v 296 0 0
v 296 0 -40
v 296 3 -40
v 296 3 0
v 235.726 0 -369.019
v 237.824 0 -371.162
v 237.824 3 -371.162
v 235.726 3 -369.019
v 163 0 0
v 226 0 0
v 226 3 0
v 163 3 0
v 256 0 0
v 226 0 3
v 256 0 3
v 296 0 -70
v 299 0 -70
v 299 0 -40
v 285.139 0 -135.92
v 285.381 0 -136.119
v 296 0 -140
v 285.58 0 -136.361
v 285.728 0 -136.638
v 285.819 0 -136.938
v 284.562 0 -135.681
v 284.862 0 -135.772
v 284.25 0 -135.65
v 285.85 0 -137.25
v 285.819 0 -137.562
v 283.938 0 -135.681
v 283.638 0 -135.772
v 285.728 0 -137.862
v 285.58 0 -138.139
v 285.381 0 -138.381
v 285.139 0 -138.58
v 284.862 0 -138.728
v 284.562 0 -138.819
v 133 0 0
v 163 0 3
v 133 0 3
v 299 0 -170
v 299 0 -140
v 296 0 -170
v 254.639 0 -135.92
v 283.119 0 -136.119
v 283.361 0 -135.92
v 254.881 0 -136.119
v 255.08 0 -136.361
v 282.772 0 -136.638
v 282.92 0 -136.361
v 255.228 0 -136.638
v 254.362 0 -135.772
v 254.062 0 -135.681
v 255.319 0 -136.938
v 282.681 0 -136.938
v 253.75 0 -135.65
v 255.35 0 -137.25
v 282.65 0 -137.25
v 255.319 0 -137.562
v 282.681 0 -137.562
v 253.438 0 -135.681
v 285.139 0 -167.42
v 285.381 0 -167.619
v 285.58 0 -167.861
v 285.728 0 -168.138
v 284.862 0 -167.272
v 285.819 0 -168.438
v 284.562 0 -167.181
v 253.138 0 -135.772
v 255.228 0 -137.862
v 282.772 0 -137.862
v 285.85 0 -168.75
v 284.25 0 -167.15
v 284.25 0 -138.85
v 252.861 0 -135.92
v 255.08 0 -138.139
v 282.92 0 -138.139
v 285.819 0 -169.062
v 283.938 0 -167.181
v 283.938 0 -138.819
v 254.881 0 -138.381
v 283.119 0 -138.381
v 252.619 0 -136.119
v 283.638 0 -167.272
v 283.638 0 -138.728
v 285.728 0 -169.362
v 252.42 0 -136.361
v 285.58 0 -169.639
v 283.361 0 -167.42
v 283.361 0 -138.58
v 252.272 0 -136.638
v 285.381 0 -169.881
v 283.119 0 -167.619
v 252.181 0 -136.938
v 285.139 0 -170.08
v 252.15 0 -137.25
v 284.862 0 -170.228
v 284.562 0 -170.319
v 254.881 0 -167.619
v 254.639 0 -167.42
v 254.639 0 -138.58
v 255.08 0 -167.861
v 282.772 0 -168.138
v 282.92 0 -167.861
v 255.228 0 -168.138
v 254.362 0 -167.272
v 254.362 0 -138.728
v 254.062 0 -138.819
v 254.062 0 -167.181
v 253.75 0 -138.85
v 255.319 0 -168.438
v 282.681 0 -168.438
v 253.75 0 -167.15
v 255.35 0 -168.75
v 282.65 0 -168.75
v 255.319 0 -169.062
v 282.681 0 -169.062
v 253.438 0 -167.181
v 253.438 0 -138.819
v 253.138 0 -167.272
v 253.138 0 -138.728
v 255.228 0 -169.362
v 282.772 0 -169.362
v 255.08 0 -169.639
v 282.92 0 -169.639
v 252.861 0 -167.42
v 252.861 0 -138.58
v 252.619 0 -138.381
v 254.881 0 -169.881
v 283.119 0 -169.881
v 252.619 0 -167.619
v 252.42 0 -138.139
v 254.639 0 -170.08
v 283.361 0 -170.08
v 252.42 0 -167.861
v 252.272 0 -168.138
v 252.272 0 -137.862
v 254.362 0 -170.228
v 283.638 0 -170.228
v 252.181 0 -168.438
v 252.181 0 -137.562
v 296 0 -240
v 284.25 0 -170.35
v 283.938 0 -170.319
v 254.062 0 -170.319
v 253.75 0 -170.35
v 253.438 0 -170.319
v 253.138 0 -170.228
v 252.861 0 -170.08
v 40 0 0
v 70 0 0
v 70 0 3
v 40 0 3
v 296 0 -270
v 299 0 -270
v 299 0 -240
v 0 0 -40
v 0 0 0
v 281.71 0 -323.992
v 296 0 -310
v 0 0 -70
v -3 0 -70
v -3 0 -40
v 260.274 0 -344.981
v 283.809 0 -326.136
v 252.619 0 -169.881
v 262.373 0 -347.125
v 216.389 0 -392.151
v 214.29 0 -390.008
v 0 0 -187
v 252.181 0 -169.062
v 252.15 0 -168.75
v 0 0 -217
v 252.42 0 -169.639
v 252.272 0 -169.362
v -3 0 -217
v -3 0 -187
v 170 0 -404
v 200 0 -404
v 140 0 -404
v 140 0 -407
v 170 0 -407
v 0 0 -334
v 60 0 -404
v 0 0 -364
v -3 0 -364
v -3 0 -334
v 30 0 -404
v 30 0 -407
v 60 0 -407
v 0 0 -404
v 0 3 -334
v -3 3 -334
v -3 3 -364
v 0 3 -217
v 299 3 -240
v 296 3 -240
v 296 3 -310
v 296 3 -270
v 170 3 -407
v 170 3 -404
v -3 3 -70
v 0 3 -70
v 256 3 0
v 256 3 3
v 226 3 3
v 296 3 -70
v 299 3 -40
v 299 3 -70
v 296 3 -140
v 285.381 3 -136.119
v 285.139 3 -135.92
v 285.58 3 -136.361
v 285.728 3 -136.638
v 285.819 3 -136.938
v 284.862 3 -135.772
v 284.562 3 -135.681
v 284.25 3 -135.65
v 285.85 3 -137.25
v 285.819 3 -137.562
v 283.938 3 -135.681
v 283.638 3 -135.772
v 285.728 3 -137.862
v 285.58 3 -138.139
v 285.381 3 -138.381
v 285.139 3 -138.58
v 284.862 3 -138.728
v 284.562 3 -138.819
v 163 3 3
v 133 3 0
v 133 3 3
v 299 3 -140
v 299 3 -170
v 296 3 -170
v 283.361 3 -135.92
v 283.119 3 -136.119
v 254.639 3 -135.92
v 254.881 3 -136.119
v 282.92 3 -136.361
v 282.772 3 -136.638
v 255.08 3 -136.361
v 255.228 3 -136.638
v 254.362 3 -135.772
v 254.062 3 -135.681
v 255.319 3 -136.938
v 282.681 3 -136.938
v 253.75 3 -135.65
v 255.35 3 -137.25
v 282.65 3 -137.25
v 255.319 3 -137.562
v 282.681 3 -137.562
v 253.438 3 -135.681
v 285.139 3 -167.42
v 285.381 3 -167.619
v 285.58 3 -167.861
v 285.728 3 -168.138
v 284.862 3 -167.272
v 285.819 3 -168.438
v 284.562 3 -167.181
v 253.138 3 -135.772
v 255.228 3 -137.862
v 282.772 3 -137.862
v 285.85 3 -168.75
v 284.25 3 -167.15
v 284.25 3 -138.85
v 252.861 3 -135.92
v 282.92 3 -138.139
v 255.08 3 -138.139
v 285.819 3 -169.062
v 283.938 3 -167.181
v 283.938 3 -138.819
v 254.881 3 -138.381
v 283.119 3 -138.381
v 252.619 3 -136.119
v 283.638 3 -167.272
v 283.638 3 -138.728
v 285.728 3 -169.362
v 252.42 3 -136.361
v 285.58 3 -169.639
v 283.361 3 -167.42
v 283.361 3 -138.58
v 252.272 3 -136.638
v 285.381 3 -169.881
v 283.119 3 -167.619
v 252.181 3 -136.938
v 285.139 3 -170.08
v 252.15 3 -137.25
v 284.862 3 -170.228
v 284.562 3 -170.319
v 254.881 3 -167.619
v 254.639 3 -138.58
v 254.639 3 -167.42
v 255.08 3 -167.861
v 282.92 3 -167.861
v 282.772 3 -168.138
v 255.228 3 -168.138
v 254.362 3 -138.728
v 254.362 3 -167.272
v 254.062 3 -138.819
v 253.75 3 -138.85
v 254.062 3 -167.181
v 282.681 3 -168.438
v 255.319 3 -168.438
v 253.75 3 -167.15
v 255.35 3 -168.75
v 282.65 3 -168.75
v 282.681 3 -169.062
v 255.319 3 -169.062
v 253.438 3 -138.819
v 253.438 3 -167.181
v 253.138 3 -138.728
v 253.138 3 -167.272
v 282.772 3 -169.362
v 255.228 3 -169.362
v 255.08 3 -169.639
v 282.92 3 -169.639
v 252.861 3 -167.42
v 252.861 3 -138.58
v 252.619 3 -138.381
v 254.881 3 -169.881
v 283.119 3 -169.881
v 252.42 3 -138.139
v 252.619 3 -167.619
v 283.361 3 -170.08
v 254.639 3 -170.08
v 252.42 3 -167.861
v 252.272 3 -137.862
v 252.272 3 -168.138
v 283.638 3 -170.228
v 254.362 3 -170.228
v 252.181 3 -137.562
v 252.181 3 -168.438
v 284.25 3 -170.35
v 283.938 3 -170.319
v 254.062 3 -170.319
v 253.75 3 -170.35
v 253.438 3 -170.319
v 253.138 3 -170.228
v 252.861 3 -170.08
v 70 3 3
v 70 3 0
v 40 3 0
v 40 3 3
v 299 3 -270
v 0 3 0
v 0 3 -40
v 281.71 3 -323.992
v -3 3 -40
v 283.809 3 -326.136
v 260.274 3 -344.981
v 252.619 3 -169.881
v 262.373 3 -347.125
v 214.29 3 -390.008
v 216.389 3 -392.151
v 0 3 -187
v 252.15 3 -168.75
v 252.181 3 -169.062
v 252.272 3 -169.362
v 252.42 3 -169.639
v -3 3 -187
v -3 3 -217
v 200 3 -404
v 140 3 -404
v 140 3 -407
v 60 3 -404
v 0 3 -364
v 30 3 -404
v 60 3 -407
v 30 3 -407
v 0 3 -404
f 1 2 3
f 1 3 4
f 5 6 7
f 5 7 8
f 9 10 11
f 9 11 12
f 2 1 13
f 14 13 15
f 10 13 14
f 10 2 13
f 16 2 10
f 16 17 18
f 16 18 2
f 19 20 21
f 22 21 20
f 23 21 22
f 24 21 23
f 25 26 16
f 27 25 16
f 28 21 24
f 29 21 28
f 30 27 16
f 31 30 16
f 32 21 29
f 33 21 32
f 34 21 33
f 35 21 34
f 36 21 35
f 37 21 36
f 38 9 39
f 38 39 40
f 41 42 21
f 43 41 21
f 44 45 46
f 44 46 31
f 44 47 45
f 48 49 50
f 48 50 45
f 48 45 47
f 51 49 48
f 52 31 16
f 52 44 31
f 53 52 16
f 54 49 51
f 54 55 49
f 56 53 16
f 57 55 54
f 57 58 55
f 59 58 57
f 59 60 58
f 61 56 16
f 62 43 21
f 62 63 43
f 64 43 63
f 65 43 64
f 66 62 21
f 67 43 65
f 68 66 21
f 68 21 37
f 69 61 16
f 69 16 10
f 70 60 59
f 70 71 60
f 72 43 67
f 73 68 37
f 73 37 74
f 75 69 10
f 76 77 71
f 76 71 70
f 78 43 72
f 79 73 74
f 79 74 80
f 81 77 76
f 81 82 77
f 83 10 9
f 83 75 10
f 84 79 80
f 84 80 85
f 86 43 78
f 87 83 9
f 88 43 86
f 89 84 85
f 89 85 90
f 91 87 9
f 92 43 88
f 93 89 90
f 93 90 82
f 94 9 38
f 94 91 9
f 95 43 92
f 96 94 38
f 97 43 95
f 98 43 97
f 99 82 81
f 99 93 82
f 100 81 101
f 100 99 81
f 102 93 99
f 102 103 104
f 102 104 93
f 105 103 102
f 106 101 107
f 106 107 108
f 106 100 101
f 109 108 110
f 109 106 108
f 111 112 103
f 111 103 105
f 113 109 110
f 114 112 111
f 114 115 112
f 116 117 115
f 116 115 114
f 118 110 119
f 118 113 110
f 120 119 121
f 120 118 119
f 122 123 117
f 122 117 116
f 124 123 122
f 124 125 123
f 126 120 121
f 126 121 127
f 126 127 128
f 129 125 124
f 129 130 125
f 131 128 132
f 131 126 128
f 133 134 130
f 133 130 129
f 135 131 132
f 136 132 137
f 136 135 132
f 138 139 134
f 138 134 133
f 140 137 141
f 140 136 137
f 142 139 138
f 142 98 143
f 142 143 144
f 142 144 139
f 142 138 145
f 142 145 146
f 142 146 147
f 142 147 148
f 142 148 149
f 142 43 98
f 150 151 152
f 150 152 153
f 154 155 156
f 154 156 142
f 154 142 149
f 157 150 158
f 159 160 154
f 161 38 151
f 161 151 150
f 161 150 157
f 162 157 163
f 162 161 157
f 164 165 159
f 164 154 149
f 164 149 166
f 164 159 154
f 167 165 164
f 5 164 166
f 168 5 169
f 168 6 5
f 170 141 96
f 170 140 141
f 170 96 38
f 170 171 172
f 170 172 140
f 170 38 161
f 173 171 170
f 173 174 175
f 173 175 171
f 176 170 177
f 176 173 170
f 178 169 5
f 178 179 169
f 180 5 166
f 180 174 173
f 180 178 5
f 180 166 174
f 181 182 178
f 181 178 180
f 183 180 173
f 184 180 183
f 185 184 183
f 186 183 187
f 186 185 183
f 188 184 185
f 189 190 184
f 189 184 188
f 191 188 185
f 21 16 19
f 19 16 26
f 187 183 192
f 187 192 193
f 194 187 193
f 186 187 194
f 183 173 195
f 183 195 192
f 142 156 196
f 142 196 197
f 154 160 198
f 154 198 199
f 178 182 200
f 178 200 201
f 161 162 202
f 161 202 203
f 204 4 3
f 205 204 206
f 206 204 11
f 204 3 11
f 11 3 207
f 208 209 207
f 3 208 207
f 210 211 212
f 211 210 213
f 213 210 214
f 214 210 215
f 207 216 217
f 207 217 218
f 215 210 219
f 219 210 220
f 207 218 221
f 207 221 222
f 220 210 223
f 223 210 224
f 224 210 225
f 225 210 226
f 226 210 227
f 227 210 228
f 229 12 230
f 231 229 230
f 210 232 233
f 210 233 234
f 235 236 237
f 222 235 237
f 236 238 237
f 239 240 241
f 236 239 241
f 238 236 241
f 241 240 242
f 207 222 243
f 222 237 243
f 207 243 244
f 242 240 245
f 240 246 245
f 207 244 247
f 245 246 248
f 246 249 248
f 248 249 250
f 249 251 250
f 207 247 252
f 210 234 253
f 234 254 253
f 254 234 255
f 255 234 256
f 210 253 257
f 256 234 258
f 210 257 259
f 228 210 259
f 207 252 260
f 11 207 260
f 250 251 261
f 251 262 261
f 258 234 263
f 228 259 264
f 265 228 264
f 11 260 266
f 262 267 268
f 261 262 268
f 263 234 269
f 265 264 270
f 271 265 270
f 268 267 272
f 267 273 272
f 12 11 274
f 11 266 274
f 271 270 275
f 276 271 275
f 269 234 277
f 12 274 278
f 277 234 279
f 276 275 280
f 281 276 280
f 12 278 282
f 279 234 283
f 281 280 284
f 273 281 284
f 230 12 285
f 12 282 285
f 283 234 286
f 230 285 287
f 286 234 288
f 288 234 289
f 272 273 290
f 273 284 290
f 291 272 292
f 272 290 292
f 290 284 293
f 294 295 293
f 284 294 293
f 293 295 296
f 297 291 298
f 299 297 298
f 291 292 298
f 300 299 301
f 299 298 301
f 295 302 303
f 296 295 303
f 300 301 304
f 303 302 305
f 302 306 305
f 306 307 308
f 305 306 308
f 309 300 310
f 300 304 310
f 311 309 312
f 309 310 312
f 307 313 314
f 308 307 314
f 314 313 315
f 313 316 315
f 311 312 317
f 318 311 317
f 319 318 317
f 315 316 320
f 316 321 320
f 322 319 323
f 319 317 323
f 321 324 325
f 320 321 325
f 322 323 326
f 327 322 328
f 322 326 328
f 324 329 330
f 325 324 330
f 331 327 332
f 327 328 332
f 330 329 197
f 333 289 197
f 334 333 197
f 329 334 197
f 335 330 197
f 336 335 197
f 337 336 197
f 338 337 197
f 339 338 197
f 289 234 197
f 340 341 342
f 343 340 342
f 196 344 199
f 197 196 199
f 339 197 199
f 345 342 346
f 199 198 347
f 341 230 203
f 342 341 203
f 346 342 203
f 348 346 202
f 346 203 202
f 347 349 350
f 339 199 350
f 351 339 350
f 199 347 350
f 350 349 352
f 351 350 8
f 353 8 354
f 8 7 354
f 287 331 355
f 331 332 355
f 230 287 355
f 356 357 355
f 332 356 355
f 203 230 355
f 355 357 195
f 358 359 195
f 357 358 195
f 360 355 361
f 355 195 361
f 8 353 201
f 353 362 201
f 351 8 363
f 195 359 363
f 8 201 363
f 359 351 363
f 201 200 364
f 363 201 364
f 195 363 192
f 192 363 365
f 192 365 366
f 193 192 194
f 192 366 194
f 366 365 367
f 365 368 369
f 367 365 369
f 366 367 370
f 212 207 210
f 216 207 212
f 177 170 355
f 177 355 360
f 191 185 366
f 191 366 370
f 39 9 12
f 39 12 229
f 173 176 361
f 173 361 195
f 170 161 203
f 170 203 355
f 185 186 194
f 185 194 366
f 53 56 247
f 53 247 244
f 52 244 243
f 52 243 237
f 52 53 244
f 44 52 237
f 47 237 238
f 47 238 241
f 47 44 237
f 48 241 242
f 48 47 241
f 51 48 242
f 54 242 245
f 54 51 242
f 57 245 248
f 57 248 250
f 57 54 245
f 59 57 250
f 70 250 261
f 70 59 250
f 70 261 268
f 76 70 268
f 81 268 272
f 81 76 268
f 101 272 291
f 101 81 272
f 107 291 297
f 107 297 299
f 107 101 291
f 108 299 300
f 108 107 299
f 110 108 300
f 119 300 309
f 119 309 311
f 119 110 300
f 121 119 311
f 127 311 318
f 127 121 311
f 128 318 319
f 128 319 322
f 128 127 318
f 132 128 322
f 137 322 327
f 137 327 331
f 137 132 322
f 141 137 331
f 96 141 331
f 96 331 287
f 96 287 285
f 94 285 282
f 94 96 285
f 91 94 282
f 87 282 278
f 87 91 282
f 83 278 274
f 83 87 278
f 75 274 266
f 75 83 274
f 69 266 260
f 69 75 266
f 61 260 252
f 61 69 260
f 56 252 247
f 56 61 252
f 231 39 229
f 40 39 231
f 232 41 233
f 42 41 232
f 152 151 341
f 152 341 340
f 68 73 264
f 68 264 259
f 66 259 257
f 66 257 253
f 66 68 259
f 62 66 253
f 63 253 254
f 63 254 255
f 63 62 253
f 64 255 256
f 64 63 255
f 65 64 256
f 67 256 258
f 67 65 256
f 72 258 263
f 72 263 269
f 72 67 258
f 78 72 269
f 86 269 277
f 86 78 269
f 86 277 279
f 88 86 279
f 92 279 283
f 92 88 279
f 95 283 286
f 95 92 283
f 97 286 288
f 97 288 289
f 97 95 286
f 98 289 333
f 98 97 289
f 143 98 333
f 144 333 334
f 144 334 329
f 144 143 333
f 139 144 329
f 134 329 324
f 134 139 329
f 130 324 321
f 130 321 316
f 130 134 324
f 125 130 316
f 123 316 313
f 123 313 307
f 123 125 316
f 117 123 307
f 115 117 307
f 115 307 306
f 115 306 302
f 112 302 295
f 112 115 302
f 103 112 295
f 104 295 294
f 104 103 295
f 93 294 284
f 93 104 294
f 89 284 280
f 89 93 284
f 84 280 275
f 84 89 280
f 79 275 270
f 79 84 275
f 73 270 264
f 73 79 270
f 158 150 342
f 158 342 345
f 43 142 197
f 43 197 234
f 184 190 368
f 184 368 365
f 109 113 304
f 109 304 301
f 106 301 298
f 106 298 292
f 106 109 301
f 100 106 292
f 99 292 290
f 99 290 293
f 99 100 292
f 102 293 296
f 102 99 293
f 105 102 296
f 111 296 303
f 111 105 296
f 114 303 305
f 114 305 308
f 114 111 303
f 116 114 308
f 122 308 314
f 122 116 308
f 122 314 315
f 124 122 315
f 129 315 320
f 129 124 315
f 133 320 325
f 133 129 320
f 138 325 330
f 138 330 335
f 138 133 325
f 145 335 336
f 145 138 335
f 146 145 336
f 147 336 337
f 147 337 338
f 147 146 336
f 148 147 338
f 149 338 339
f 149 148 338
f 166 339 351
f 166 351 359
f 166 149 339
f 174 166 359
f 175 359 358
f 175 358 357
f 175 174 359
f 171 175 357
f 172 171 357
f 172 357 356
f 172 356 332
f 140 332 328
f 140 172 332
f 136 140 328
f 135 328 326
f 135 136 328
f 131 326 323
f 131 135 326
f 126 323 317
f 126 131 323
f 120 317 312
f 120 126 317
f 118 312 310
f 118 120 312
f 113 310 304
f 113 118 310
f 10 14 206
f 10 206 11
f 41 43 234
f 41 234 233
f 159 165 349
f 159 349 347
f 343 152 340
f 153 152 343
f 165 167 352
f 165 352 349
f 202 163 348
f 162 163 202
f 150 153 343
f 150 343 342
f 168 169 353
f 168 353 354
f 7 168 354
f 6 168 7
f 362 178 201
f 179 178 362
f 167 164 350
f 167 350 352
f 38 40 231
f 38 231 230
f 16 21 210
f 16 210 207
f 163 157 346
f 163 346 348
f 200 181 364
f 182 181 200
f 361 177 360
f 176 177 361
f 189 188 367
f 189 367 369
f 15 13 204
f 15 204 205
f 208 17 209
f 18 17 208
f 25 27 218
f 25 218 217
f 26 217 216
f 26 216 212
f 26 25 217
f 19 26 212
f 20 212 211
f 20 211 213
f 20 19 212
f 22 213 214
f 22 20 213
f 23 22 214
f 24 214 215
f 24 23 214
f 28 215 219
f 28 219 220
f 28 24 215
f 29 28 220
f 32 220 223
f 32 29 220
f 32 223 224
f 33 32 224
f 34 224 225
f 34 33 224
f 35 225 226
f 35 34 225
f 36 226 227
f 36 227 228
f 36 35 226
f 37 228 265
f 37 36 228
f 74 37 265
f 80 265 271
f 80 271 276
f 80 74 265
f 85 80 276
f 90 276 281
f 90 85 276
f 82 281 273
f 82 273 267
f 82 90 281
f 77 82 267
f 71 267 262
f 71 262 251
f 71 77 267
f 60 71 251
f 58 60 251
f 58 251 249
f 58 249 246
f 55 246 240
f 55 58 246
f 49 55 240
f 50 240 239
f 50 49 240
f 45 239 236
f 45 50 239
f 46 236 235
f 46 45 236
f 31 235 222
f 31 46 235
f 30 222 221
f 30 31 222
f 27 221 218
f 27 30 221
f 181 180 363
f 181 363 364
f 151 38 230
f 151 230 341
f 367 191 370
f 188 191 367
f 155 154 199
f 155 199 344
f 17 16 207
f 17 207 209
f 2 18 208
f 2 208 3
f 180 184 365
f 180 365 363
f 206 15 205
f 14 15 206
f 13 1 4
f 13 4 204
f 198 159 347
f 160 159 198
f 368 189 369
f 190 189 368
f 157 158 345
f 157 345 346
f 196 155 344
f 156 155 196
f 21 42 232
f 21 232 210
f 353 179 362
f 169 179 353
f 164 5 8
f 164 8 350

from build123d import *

# Parameters (mm, degrees)
SKETCH1_R           = 1.6
BOSS_EXTRUDE1_DEPTH = 3


with BuildPart() as part:
    # Sketch1 → Boss-Extrude1 (new body)
    with BuildSketch(Plane(origin=(0, 0, 0), x_dir=(1, 0, 0), z_dir=(0, 1, 0))):
        Polygon((0, 0), (0, 40), (-3, 40), (-3, 70), (0, 70), (0, 187), (-3, 187), (-3, 217), (0, 217), (0, 334), (-3, 334), (-3, 364), (0, 364), (0, 404), (30, 404), (30, 407), (60, 407), (60, 404), (140, 404), (140, 407), (170, 407), (170, 404), (200, 404), (214.29020853, 390.007504148), (216.389082908, 392.151035427), (237.824395702, 371.162291649), (235.725521325, 369.01876037), (260.274478675, 344.98123963), (262.373353053, 347.12477091), (283.808665848, 326.136027132), (281.70979147, 323.992495852), (296, 310), (296, 270), (299, 270), (299, 240), (296, 240), (296, 170), (299, 170), (299, 140), (296, 140), (296, 70), (299, 70), (299, 40), (296, 40), (296, 0), (256, 0), (256, -3), (226, -3), (226, 0), (163, 0), (163, -3), (133, -3), (133, 0), (70, 0), (70, -3), (40, -3), (40, 0), align=None)
        with Locations(Location((253.75, 168.75, 0), (0, 0, 270))):
            Circle(SKETCH1_R, mode=Mode.SUBTRACT)
        with Locations(Location((284.25, 168.75, 0), (0, 0, 270))):
            Circle(SKETCH1_R, mode=Mode.SUBTRACT)
        with Locations(Location((284.25, 137.25, 0), (0, 0, 270))):
            Circle(SKETCH1_R, mode=Mode.SUBTRACT)
        with Locations(Location((253.75, 137.25, 0), (0, 0, 270))):
            Circle(SKETCH1_R, mode=Mode.SUBTRACT)
    extrude(amount=BOSS_EXTRUDE1_DEPTH)


solid = part.part
